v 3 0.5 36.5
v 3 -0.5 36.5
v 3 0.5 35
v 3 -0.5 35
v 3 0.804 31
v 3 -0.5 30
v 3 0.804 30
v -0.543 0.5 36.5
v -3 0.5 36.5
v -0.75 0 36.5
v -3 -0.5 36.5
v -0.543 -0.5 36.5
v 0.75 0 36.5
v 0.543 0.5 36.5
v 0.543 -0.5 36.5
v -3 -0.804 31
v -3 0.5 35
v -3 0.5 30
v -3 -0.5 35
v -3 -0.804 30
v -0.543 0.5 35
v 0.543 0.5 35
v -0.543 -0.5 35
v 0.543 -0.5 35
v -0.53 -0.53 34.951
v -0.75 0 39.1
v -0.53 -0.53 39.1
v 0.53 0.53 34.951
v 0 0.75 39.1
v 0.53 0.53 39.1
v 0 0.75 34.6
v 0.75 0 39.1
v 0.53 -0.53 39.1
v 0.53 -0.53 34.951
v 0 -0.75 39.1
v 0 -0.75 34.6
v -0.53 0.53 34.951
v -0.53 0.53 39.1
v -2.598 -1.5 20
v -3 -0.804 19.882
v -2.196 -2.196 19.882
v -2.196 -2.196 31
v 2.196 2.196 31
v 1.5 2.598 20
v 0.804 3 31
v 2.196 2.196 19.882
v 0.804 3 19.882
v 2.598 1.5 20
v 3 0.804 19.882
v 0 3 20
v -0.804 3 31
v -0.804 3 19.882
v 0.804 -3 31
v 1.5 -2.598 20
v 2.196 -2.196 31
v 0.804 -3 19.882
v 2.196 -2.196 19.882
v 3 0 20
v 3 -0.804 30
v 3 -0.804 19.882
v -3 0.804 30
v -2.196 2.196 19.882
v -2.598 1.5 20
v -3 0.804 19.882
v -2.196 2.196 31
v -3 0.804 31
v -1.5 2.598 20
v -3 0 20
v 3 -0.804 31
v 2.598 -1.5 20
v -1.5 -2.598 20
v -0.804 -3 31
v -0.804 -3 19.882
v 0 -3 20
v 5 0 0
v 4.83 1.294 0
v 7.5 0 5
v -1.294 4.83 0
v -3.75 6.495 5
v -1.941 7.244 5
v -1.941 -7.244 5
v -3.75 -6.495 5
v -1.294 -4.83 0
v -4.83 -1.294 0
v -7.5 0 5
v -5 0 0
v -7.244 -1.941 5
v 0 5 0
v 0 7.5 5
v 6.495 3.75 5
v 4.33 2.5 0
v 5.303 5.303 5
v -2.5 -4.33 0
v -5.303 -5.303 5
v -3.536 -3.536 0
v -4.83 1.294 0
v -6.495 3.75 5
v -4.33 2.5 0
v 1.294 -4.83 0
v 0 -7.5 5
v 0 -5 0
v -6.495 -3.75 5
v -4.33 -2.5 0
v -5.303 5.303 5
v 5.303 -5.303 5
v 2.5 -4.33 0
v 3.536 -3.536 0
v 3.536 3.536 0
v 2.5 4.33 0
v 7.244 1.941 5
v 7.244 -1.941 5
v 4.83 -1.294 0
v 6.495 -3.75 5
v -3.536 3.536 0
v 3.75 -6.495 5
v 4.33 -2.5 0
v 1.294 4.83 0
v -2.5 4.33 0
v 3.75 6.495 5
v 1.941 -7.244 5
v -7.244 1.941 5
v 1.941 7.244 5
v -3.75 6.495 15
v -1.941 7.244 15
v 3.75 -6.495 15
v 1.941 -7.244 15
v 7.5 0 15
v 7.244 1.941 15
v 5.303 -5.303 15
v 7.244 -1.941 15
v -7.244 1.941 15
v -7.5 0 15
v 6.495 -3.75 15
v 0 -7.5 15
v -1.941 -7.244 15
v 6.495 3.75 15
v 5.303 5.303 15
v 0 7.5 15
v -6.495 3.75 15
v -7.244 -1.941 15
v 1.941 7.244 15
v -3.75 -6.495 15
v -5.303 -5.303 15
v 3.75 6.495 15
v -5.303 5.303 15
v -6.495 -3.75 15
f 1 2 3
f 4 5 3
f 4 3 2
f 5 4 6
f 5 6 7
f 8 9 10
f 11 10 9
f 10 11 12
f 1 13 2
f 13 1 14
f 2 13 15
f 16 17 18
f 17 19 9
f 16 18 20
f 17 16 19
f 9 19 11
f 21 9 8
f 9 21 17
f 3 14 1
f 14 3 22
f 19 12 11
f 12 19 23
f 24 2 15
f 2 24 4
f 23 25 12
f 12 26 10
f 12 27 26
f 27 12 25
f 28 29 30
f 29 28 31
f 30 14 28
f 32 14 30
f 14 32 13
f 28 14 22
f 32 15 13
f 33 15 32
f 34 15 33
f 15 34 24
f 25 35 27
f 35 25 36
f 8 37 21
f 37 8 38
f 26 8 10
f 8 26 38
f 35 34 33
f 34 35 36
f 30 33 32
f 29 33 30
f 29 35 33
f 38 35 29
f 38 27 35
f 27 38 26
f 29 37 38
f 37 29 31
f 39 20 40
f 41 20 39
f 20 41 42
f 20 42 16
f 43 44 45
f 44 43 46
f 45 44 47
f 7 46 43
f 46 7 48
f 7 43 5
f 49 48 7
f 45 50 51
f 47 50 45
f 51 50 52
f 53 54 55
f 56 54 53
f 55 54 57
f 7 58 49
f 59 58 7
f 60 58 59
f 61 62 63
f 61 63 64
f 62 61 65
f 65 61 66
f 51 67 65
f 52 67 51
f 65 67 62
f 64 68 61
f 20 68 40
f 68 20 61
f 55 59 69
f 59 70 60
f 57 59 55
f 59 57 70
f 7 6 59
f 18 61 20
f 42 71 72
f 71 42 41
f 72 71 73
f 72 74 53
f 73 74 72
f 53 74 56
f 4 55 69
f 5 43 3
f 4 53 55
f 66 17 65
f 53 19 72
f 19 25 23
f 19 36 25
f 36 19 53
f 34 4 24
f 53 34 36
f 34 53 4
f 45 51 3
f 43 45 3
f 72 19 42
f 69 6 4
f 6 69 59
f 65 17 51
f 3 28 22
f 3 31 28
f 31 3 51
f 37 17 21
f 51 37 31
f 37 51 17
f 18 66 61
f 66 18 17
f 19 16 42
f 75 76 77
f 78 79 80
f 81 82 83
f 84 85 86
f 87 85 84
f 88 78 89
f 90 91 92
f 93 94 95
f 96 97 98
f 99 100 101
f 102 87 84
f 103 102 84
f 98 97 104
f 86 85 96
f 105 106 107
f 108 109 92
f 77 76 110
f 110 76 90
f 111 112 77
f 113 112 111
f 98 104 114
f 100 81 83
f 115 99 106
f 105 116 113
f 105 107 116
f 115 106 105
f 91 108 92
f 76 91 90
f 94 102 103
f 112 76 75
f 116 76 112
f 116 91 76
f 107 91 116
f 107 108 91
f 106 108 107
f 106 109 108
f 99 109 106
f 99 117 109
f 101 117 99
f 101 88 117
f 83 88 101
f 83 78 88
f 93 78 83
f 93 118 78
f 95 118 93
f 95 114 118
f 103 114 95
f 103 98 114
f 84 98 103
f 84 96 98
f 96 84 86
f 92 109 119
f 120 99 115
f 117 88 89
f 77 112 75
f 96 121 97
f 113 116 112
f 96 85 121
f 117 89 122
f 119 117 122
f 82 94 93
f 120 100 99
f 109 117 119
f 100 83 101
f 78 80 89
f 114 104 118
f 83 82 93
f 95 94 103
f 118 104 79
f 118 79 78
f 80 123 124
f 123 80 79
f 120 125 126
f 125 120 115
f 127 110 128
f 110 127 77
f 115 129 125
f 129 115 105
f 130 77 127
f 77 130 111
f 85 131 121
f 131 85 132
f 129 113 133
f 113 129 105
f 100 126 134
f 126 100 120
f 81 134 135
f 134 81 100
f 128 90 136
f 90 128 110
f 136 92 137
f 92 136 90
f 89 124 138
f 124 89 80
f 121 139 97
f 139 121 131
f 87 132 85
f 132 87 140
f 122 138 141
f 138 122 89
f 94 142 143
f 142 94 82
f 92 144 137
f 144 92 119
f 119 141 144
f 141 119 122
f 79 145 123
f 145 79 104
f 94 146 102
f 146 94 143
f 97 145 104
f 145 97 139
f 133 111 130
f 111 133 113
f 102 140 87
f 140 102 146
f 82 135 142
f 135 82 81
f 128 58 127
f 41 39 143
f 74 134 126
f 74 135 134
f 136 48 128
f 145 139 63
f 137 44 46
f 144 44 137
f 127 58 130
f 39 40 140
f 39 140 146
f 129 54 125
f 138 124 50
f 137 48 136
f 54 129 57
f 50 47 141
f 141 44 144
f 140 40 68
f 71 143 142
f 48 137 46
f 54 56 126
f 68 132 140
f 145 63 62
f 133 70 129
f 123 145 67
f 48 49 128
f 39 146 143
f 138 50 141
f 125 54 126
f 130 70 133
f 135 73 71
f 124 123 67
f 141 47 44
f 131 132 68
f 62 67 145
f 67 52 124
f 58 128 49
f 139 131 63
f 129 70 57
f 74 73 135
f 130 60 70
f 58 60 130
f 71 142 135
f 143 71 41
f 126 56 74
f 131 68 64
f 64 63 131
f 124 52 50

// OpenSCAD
nippleSlot = 1.0;
spokeD = 1.5;
desiredSpokeOffset = 2.5;
spokeExcessLength = -0.1;

module blade() {
    translate([0,0,0.75]) cube([6, nippleSlot, 1.5], center=true);
    translate([0,0,-8.5 + (desiredSpokeOffset - spokeExcessLength)])
        cylinder(d=spokeD, h=10, center=false, $fn=8);
}

module shaft() {
    cylinder(d1=10, d2=15, h=5, center=false);
    translate([0,0,5]) cylinder(d=15, h=10, center=false);
    translate([0,0,15]) cylinder(d1=15, d2=6, h=5, center=false);
    translate([0,0,5]) {
        rotate([0,0,180/12]) cylinder(d=6/cos(180/12), h=25, center=false, $fn=12);
        translate([0,0,25]) hull() {
            rotate([0,0,180/12]) cylinder(d=6/cos(180/12), h=1, center=false, $fn=12);
            translate([-3,-nippleSlot/2,0]) cube([6, nippleSlot, 5], center=false);
        }
        translate([0, 0, 30]) blade();
    }
}

shaft();
